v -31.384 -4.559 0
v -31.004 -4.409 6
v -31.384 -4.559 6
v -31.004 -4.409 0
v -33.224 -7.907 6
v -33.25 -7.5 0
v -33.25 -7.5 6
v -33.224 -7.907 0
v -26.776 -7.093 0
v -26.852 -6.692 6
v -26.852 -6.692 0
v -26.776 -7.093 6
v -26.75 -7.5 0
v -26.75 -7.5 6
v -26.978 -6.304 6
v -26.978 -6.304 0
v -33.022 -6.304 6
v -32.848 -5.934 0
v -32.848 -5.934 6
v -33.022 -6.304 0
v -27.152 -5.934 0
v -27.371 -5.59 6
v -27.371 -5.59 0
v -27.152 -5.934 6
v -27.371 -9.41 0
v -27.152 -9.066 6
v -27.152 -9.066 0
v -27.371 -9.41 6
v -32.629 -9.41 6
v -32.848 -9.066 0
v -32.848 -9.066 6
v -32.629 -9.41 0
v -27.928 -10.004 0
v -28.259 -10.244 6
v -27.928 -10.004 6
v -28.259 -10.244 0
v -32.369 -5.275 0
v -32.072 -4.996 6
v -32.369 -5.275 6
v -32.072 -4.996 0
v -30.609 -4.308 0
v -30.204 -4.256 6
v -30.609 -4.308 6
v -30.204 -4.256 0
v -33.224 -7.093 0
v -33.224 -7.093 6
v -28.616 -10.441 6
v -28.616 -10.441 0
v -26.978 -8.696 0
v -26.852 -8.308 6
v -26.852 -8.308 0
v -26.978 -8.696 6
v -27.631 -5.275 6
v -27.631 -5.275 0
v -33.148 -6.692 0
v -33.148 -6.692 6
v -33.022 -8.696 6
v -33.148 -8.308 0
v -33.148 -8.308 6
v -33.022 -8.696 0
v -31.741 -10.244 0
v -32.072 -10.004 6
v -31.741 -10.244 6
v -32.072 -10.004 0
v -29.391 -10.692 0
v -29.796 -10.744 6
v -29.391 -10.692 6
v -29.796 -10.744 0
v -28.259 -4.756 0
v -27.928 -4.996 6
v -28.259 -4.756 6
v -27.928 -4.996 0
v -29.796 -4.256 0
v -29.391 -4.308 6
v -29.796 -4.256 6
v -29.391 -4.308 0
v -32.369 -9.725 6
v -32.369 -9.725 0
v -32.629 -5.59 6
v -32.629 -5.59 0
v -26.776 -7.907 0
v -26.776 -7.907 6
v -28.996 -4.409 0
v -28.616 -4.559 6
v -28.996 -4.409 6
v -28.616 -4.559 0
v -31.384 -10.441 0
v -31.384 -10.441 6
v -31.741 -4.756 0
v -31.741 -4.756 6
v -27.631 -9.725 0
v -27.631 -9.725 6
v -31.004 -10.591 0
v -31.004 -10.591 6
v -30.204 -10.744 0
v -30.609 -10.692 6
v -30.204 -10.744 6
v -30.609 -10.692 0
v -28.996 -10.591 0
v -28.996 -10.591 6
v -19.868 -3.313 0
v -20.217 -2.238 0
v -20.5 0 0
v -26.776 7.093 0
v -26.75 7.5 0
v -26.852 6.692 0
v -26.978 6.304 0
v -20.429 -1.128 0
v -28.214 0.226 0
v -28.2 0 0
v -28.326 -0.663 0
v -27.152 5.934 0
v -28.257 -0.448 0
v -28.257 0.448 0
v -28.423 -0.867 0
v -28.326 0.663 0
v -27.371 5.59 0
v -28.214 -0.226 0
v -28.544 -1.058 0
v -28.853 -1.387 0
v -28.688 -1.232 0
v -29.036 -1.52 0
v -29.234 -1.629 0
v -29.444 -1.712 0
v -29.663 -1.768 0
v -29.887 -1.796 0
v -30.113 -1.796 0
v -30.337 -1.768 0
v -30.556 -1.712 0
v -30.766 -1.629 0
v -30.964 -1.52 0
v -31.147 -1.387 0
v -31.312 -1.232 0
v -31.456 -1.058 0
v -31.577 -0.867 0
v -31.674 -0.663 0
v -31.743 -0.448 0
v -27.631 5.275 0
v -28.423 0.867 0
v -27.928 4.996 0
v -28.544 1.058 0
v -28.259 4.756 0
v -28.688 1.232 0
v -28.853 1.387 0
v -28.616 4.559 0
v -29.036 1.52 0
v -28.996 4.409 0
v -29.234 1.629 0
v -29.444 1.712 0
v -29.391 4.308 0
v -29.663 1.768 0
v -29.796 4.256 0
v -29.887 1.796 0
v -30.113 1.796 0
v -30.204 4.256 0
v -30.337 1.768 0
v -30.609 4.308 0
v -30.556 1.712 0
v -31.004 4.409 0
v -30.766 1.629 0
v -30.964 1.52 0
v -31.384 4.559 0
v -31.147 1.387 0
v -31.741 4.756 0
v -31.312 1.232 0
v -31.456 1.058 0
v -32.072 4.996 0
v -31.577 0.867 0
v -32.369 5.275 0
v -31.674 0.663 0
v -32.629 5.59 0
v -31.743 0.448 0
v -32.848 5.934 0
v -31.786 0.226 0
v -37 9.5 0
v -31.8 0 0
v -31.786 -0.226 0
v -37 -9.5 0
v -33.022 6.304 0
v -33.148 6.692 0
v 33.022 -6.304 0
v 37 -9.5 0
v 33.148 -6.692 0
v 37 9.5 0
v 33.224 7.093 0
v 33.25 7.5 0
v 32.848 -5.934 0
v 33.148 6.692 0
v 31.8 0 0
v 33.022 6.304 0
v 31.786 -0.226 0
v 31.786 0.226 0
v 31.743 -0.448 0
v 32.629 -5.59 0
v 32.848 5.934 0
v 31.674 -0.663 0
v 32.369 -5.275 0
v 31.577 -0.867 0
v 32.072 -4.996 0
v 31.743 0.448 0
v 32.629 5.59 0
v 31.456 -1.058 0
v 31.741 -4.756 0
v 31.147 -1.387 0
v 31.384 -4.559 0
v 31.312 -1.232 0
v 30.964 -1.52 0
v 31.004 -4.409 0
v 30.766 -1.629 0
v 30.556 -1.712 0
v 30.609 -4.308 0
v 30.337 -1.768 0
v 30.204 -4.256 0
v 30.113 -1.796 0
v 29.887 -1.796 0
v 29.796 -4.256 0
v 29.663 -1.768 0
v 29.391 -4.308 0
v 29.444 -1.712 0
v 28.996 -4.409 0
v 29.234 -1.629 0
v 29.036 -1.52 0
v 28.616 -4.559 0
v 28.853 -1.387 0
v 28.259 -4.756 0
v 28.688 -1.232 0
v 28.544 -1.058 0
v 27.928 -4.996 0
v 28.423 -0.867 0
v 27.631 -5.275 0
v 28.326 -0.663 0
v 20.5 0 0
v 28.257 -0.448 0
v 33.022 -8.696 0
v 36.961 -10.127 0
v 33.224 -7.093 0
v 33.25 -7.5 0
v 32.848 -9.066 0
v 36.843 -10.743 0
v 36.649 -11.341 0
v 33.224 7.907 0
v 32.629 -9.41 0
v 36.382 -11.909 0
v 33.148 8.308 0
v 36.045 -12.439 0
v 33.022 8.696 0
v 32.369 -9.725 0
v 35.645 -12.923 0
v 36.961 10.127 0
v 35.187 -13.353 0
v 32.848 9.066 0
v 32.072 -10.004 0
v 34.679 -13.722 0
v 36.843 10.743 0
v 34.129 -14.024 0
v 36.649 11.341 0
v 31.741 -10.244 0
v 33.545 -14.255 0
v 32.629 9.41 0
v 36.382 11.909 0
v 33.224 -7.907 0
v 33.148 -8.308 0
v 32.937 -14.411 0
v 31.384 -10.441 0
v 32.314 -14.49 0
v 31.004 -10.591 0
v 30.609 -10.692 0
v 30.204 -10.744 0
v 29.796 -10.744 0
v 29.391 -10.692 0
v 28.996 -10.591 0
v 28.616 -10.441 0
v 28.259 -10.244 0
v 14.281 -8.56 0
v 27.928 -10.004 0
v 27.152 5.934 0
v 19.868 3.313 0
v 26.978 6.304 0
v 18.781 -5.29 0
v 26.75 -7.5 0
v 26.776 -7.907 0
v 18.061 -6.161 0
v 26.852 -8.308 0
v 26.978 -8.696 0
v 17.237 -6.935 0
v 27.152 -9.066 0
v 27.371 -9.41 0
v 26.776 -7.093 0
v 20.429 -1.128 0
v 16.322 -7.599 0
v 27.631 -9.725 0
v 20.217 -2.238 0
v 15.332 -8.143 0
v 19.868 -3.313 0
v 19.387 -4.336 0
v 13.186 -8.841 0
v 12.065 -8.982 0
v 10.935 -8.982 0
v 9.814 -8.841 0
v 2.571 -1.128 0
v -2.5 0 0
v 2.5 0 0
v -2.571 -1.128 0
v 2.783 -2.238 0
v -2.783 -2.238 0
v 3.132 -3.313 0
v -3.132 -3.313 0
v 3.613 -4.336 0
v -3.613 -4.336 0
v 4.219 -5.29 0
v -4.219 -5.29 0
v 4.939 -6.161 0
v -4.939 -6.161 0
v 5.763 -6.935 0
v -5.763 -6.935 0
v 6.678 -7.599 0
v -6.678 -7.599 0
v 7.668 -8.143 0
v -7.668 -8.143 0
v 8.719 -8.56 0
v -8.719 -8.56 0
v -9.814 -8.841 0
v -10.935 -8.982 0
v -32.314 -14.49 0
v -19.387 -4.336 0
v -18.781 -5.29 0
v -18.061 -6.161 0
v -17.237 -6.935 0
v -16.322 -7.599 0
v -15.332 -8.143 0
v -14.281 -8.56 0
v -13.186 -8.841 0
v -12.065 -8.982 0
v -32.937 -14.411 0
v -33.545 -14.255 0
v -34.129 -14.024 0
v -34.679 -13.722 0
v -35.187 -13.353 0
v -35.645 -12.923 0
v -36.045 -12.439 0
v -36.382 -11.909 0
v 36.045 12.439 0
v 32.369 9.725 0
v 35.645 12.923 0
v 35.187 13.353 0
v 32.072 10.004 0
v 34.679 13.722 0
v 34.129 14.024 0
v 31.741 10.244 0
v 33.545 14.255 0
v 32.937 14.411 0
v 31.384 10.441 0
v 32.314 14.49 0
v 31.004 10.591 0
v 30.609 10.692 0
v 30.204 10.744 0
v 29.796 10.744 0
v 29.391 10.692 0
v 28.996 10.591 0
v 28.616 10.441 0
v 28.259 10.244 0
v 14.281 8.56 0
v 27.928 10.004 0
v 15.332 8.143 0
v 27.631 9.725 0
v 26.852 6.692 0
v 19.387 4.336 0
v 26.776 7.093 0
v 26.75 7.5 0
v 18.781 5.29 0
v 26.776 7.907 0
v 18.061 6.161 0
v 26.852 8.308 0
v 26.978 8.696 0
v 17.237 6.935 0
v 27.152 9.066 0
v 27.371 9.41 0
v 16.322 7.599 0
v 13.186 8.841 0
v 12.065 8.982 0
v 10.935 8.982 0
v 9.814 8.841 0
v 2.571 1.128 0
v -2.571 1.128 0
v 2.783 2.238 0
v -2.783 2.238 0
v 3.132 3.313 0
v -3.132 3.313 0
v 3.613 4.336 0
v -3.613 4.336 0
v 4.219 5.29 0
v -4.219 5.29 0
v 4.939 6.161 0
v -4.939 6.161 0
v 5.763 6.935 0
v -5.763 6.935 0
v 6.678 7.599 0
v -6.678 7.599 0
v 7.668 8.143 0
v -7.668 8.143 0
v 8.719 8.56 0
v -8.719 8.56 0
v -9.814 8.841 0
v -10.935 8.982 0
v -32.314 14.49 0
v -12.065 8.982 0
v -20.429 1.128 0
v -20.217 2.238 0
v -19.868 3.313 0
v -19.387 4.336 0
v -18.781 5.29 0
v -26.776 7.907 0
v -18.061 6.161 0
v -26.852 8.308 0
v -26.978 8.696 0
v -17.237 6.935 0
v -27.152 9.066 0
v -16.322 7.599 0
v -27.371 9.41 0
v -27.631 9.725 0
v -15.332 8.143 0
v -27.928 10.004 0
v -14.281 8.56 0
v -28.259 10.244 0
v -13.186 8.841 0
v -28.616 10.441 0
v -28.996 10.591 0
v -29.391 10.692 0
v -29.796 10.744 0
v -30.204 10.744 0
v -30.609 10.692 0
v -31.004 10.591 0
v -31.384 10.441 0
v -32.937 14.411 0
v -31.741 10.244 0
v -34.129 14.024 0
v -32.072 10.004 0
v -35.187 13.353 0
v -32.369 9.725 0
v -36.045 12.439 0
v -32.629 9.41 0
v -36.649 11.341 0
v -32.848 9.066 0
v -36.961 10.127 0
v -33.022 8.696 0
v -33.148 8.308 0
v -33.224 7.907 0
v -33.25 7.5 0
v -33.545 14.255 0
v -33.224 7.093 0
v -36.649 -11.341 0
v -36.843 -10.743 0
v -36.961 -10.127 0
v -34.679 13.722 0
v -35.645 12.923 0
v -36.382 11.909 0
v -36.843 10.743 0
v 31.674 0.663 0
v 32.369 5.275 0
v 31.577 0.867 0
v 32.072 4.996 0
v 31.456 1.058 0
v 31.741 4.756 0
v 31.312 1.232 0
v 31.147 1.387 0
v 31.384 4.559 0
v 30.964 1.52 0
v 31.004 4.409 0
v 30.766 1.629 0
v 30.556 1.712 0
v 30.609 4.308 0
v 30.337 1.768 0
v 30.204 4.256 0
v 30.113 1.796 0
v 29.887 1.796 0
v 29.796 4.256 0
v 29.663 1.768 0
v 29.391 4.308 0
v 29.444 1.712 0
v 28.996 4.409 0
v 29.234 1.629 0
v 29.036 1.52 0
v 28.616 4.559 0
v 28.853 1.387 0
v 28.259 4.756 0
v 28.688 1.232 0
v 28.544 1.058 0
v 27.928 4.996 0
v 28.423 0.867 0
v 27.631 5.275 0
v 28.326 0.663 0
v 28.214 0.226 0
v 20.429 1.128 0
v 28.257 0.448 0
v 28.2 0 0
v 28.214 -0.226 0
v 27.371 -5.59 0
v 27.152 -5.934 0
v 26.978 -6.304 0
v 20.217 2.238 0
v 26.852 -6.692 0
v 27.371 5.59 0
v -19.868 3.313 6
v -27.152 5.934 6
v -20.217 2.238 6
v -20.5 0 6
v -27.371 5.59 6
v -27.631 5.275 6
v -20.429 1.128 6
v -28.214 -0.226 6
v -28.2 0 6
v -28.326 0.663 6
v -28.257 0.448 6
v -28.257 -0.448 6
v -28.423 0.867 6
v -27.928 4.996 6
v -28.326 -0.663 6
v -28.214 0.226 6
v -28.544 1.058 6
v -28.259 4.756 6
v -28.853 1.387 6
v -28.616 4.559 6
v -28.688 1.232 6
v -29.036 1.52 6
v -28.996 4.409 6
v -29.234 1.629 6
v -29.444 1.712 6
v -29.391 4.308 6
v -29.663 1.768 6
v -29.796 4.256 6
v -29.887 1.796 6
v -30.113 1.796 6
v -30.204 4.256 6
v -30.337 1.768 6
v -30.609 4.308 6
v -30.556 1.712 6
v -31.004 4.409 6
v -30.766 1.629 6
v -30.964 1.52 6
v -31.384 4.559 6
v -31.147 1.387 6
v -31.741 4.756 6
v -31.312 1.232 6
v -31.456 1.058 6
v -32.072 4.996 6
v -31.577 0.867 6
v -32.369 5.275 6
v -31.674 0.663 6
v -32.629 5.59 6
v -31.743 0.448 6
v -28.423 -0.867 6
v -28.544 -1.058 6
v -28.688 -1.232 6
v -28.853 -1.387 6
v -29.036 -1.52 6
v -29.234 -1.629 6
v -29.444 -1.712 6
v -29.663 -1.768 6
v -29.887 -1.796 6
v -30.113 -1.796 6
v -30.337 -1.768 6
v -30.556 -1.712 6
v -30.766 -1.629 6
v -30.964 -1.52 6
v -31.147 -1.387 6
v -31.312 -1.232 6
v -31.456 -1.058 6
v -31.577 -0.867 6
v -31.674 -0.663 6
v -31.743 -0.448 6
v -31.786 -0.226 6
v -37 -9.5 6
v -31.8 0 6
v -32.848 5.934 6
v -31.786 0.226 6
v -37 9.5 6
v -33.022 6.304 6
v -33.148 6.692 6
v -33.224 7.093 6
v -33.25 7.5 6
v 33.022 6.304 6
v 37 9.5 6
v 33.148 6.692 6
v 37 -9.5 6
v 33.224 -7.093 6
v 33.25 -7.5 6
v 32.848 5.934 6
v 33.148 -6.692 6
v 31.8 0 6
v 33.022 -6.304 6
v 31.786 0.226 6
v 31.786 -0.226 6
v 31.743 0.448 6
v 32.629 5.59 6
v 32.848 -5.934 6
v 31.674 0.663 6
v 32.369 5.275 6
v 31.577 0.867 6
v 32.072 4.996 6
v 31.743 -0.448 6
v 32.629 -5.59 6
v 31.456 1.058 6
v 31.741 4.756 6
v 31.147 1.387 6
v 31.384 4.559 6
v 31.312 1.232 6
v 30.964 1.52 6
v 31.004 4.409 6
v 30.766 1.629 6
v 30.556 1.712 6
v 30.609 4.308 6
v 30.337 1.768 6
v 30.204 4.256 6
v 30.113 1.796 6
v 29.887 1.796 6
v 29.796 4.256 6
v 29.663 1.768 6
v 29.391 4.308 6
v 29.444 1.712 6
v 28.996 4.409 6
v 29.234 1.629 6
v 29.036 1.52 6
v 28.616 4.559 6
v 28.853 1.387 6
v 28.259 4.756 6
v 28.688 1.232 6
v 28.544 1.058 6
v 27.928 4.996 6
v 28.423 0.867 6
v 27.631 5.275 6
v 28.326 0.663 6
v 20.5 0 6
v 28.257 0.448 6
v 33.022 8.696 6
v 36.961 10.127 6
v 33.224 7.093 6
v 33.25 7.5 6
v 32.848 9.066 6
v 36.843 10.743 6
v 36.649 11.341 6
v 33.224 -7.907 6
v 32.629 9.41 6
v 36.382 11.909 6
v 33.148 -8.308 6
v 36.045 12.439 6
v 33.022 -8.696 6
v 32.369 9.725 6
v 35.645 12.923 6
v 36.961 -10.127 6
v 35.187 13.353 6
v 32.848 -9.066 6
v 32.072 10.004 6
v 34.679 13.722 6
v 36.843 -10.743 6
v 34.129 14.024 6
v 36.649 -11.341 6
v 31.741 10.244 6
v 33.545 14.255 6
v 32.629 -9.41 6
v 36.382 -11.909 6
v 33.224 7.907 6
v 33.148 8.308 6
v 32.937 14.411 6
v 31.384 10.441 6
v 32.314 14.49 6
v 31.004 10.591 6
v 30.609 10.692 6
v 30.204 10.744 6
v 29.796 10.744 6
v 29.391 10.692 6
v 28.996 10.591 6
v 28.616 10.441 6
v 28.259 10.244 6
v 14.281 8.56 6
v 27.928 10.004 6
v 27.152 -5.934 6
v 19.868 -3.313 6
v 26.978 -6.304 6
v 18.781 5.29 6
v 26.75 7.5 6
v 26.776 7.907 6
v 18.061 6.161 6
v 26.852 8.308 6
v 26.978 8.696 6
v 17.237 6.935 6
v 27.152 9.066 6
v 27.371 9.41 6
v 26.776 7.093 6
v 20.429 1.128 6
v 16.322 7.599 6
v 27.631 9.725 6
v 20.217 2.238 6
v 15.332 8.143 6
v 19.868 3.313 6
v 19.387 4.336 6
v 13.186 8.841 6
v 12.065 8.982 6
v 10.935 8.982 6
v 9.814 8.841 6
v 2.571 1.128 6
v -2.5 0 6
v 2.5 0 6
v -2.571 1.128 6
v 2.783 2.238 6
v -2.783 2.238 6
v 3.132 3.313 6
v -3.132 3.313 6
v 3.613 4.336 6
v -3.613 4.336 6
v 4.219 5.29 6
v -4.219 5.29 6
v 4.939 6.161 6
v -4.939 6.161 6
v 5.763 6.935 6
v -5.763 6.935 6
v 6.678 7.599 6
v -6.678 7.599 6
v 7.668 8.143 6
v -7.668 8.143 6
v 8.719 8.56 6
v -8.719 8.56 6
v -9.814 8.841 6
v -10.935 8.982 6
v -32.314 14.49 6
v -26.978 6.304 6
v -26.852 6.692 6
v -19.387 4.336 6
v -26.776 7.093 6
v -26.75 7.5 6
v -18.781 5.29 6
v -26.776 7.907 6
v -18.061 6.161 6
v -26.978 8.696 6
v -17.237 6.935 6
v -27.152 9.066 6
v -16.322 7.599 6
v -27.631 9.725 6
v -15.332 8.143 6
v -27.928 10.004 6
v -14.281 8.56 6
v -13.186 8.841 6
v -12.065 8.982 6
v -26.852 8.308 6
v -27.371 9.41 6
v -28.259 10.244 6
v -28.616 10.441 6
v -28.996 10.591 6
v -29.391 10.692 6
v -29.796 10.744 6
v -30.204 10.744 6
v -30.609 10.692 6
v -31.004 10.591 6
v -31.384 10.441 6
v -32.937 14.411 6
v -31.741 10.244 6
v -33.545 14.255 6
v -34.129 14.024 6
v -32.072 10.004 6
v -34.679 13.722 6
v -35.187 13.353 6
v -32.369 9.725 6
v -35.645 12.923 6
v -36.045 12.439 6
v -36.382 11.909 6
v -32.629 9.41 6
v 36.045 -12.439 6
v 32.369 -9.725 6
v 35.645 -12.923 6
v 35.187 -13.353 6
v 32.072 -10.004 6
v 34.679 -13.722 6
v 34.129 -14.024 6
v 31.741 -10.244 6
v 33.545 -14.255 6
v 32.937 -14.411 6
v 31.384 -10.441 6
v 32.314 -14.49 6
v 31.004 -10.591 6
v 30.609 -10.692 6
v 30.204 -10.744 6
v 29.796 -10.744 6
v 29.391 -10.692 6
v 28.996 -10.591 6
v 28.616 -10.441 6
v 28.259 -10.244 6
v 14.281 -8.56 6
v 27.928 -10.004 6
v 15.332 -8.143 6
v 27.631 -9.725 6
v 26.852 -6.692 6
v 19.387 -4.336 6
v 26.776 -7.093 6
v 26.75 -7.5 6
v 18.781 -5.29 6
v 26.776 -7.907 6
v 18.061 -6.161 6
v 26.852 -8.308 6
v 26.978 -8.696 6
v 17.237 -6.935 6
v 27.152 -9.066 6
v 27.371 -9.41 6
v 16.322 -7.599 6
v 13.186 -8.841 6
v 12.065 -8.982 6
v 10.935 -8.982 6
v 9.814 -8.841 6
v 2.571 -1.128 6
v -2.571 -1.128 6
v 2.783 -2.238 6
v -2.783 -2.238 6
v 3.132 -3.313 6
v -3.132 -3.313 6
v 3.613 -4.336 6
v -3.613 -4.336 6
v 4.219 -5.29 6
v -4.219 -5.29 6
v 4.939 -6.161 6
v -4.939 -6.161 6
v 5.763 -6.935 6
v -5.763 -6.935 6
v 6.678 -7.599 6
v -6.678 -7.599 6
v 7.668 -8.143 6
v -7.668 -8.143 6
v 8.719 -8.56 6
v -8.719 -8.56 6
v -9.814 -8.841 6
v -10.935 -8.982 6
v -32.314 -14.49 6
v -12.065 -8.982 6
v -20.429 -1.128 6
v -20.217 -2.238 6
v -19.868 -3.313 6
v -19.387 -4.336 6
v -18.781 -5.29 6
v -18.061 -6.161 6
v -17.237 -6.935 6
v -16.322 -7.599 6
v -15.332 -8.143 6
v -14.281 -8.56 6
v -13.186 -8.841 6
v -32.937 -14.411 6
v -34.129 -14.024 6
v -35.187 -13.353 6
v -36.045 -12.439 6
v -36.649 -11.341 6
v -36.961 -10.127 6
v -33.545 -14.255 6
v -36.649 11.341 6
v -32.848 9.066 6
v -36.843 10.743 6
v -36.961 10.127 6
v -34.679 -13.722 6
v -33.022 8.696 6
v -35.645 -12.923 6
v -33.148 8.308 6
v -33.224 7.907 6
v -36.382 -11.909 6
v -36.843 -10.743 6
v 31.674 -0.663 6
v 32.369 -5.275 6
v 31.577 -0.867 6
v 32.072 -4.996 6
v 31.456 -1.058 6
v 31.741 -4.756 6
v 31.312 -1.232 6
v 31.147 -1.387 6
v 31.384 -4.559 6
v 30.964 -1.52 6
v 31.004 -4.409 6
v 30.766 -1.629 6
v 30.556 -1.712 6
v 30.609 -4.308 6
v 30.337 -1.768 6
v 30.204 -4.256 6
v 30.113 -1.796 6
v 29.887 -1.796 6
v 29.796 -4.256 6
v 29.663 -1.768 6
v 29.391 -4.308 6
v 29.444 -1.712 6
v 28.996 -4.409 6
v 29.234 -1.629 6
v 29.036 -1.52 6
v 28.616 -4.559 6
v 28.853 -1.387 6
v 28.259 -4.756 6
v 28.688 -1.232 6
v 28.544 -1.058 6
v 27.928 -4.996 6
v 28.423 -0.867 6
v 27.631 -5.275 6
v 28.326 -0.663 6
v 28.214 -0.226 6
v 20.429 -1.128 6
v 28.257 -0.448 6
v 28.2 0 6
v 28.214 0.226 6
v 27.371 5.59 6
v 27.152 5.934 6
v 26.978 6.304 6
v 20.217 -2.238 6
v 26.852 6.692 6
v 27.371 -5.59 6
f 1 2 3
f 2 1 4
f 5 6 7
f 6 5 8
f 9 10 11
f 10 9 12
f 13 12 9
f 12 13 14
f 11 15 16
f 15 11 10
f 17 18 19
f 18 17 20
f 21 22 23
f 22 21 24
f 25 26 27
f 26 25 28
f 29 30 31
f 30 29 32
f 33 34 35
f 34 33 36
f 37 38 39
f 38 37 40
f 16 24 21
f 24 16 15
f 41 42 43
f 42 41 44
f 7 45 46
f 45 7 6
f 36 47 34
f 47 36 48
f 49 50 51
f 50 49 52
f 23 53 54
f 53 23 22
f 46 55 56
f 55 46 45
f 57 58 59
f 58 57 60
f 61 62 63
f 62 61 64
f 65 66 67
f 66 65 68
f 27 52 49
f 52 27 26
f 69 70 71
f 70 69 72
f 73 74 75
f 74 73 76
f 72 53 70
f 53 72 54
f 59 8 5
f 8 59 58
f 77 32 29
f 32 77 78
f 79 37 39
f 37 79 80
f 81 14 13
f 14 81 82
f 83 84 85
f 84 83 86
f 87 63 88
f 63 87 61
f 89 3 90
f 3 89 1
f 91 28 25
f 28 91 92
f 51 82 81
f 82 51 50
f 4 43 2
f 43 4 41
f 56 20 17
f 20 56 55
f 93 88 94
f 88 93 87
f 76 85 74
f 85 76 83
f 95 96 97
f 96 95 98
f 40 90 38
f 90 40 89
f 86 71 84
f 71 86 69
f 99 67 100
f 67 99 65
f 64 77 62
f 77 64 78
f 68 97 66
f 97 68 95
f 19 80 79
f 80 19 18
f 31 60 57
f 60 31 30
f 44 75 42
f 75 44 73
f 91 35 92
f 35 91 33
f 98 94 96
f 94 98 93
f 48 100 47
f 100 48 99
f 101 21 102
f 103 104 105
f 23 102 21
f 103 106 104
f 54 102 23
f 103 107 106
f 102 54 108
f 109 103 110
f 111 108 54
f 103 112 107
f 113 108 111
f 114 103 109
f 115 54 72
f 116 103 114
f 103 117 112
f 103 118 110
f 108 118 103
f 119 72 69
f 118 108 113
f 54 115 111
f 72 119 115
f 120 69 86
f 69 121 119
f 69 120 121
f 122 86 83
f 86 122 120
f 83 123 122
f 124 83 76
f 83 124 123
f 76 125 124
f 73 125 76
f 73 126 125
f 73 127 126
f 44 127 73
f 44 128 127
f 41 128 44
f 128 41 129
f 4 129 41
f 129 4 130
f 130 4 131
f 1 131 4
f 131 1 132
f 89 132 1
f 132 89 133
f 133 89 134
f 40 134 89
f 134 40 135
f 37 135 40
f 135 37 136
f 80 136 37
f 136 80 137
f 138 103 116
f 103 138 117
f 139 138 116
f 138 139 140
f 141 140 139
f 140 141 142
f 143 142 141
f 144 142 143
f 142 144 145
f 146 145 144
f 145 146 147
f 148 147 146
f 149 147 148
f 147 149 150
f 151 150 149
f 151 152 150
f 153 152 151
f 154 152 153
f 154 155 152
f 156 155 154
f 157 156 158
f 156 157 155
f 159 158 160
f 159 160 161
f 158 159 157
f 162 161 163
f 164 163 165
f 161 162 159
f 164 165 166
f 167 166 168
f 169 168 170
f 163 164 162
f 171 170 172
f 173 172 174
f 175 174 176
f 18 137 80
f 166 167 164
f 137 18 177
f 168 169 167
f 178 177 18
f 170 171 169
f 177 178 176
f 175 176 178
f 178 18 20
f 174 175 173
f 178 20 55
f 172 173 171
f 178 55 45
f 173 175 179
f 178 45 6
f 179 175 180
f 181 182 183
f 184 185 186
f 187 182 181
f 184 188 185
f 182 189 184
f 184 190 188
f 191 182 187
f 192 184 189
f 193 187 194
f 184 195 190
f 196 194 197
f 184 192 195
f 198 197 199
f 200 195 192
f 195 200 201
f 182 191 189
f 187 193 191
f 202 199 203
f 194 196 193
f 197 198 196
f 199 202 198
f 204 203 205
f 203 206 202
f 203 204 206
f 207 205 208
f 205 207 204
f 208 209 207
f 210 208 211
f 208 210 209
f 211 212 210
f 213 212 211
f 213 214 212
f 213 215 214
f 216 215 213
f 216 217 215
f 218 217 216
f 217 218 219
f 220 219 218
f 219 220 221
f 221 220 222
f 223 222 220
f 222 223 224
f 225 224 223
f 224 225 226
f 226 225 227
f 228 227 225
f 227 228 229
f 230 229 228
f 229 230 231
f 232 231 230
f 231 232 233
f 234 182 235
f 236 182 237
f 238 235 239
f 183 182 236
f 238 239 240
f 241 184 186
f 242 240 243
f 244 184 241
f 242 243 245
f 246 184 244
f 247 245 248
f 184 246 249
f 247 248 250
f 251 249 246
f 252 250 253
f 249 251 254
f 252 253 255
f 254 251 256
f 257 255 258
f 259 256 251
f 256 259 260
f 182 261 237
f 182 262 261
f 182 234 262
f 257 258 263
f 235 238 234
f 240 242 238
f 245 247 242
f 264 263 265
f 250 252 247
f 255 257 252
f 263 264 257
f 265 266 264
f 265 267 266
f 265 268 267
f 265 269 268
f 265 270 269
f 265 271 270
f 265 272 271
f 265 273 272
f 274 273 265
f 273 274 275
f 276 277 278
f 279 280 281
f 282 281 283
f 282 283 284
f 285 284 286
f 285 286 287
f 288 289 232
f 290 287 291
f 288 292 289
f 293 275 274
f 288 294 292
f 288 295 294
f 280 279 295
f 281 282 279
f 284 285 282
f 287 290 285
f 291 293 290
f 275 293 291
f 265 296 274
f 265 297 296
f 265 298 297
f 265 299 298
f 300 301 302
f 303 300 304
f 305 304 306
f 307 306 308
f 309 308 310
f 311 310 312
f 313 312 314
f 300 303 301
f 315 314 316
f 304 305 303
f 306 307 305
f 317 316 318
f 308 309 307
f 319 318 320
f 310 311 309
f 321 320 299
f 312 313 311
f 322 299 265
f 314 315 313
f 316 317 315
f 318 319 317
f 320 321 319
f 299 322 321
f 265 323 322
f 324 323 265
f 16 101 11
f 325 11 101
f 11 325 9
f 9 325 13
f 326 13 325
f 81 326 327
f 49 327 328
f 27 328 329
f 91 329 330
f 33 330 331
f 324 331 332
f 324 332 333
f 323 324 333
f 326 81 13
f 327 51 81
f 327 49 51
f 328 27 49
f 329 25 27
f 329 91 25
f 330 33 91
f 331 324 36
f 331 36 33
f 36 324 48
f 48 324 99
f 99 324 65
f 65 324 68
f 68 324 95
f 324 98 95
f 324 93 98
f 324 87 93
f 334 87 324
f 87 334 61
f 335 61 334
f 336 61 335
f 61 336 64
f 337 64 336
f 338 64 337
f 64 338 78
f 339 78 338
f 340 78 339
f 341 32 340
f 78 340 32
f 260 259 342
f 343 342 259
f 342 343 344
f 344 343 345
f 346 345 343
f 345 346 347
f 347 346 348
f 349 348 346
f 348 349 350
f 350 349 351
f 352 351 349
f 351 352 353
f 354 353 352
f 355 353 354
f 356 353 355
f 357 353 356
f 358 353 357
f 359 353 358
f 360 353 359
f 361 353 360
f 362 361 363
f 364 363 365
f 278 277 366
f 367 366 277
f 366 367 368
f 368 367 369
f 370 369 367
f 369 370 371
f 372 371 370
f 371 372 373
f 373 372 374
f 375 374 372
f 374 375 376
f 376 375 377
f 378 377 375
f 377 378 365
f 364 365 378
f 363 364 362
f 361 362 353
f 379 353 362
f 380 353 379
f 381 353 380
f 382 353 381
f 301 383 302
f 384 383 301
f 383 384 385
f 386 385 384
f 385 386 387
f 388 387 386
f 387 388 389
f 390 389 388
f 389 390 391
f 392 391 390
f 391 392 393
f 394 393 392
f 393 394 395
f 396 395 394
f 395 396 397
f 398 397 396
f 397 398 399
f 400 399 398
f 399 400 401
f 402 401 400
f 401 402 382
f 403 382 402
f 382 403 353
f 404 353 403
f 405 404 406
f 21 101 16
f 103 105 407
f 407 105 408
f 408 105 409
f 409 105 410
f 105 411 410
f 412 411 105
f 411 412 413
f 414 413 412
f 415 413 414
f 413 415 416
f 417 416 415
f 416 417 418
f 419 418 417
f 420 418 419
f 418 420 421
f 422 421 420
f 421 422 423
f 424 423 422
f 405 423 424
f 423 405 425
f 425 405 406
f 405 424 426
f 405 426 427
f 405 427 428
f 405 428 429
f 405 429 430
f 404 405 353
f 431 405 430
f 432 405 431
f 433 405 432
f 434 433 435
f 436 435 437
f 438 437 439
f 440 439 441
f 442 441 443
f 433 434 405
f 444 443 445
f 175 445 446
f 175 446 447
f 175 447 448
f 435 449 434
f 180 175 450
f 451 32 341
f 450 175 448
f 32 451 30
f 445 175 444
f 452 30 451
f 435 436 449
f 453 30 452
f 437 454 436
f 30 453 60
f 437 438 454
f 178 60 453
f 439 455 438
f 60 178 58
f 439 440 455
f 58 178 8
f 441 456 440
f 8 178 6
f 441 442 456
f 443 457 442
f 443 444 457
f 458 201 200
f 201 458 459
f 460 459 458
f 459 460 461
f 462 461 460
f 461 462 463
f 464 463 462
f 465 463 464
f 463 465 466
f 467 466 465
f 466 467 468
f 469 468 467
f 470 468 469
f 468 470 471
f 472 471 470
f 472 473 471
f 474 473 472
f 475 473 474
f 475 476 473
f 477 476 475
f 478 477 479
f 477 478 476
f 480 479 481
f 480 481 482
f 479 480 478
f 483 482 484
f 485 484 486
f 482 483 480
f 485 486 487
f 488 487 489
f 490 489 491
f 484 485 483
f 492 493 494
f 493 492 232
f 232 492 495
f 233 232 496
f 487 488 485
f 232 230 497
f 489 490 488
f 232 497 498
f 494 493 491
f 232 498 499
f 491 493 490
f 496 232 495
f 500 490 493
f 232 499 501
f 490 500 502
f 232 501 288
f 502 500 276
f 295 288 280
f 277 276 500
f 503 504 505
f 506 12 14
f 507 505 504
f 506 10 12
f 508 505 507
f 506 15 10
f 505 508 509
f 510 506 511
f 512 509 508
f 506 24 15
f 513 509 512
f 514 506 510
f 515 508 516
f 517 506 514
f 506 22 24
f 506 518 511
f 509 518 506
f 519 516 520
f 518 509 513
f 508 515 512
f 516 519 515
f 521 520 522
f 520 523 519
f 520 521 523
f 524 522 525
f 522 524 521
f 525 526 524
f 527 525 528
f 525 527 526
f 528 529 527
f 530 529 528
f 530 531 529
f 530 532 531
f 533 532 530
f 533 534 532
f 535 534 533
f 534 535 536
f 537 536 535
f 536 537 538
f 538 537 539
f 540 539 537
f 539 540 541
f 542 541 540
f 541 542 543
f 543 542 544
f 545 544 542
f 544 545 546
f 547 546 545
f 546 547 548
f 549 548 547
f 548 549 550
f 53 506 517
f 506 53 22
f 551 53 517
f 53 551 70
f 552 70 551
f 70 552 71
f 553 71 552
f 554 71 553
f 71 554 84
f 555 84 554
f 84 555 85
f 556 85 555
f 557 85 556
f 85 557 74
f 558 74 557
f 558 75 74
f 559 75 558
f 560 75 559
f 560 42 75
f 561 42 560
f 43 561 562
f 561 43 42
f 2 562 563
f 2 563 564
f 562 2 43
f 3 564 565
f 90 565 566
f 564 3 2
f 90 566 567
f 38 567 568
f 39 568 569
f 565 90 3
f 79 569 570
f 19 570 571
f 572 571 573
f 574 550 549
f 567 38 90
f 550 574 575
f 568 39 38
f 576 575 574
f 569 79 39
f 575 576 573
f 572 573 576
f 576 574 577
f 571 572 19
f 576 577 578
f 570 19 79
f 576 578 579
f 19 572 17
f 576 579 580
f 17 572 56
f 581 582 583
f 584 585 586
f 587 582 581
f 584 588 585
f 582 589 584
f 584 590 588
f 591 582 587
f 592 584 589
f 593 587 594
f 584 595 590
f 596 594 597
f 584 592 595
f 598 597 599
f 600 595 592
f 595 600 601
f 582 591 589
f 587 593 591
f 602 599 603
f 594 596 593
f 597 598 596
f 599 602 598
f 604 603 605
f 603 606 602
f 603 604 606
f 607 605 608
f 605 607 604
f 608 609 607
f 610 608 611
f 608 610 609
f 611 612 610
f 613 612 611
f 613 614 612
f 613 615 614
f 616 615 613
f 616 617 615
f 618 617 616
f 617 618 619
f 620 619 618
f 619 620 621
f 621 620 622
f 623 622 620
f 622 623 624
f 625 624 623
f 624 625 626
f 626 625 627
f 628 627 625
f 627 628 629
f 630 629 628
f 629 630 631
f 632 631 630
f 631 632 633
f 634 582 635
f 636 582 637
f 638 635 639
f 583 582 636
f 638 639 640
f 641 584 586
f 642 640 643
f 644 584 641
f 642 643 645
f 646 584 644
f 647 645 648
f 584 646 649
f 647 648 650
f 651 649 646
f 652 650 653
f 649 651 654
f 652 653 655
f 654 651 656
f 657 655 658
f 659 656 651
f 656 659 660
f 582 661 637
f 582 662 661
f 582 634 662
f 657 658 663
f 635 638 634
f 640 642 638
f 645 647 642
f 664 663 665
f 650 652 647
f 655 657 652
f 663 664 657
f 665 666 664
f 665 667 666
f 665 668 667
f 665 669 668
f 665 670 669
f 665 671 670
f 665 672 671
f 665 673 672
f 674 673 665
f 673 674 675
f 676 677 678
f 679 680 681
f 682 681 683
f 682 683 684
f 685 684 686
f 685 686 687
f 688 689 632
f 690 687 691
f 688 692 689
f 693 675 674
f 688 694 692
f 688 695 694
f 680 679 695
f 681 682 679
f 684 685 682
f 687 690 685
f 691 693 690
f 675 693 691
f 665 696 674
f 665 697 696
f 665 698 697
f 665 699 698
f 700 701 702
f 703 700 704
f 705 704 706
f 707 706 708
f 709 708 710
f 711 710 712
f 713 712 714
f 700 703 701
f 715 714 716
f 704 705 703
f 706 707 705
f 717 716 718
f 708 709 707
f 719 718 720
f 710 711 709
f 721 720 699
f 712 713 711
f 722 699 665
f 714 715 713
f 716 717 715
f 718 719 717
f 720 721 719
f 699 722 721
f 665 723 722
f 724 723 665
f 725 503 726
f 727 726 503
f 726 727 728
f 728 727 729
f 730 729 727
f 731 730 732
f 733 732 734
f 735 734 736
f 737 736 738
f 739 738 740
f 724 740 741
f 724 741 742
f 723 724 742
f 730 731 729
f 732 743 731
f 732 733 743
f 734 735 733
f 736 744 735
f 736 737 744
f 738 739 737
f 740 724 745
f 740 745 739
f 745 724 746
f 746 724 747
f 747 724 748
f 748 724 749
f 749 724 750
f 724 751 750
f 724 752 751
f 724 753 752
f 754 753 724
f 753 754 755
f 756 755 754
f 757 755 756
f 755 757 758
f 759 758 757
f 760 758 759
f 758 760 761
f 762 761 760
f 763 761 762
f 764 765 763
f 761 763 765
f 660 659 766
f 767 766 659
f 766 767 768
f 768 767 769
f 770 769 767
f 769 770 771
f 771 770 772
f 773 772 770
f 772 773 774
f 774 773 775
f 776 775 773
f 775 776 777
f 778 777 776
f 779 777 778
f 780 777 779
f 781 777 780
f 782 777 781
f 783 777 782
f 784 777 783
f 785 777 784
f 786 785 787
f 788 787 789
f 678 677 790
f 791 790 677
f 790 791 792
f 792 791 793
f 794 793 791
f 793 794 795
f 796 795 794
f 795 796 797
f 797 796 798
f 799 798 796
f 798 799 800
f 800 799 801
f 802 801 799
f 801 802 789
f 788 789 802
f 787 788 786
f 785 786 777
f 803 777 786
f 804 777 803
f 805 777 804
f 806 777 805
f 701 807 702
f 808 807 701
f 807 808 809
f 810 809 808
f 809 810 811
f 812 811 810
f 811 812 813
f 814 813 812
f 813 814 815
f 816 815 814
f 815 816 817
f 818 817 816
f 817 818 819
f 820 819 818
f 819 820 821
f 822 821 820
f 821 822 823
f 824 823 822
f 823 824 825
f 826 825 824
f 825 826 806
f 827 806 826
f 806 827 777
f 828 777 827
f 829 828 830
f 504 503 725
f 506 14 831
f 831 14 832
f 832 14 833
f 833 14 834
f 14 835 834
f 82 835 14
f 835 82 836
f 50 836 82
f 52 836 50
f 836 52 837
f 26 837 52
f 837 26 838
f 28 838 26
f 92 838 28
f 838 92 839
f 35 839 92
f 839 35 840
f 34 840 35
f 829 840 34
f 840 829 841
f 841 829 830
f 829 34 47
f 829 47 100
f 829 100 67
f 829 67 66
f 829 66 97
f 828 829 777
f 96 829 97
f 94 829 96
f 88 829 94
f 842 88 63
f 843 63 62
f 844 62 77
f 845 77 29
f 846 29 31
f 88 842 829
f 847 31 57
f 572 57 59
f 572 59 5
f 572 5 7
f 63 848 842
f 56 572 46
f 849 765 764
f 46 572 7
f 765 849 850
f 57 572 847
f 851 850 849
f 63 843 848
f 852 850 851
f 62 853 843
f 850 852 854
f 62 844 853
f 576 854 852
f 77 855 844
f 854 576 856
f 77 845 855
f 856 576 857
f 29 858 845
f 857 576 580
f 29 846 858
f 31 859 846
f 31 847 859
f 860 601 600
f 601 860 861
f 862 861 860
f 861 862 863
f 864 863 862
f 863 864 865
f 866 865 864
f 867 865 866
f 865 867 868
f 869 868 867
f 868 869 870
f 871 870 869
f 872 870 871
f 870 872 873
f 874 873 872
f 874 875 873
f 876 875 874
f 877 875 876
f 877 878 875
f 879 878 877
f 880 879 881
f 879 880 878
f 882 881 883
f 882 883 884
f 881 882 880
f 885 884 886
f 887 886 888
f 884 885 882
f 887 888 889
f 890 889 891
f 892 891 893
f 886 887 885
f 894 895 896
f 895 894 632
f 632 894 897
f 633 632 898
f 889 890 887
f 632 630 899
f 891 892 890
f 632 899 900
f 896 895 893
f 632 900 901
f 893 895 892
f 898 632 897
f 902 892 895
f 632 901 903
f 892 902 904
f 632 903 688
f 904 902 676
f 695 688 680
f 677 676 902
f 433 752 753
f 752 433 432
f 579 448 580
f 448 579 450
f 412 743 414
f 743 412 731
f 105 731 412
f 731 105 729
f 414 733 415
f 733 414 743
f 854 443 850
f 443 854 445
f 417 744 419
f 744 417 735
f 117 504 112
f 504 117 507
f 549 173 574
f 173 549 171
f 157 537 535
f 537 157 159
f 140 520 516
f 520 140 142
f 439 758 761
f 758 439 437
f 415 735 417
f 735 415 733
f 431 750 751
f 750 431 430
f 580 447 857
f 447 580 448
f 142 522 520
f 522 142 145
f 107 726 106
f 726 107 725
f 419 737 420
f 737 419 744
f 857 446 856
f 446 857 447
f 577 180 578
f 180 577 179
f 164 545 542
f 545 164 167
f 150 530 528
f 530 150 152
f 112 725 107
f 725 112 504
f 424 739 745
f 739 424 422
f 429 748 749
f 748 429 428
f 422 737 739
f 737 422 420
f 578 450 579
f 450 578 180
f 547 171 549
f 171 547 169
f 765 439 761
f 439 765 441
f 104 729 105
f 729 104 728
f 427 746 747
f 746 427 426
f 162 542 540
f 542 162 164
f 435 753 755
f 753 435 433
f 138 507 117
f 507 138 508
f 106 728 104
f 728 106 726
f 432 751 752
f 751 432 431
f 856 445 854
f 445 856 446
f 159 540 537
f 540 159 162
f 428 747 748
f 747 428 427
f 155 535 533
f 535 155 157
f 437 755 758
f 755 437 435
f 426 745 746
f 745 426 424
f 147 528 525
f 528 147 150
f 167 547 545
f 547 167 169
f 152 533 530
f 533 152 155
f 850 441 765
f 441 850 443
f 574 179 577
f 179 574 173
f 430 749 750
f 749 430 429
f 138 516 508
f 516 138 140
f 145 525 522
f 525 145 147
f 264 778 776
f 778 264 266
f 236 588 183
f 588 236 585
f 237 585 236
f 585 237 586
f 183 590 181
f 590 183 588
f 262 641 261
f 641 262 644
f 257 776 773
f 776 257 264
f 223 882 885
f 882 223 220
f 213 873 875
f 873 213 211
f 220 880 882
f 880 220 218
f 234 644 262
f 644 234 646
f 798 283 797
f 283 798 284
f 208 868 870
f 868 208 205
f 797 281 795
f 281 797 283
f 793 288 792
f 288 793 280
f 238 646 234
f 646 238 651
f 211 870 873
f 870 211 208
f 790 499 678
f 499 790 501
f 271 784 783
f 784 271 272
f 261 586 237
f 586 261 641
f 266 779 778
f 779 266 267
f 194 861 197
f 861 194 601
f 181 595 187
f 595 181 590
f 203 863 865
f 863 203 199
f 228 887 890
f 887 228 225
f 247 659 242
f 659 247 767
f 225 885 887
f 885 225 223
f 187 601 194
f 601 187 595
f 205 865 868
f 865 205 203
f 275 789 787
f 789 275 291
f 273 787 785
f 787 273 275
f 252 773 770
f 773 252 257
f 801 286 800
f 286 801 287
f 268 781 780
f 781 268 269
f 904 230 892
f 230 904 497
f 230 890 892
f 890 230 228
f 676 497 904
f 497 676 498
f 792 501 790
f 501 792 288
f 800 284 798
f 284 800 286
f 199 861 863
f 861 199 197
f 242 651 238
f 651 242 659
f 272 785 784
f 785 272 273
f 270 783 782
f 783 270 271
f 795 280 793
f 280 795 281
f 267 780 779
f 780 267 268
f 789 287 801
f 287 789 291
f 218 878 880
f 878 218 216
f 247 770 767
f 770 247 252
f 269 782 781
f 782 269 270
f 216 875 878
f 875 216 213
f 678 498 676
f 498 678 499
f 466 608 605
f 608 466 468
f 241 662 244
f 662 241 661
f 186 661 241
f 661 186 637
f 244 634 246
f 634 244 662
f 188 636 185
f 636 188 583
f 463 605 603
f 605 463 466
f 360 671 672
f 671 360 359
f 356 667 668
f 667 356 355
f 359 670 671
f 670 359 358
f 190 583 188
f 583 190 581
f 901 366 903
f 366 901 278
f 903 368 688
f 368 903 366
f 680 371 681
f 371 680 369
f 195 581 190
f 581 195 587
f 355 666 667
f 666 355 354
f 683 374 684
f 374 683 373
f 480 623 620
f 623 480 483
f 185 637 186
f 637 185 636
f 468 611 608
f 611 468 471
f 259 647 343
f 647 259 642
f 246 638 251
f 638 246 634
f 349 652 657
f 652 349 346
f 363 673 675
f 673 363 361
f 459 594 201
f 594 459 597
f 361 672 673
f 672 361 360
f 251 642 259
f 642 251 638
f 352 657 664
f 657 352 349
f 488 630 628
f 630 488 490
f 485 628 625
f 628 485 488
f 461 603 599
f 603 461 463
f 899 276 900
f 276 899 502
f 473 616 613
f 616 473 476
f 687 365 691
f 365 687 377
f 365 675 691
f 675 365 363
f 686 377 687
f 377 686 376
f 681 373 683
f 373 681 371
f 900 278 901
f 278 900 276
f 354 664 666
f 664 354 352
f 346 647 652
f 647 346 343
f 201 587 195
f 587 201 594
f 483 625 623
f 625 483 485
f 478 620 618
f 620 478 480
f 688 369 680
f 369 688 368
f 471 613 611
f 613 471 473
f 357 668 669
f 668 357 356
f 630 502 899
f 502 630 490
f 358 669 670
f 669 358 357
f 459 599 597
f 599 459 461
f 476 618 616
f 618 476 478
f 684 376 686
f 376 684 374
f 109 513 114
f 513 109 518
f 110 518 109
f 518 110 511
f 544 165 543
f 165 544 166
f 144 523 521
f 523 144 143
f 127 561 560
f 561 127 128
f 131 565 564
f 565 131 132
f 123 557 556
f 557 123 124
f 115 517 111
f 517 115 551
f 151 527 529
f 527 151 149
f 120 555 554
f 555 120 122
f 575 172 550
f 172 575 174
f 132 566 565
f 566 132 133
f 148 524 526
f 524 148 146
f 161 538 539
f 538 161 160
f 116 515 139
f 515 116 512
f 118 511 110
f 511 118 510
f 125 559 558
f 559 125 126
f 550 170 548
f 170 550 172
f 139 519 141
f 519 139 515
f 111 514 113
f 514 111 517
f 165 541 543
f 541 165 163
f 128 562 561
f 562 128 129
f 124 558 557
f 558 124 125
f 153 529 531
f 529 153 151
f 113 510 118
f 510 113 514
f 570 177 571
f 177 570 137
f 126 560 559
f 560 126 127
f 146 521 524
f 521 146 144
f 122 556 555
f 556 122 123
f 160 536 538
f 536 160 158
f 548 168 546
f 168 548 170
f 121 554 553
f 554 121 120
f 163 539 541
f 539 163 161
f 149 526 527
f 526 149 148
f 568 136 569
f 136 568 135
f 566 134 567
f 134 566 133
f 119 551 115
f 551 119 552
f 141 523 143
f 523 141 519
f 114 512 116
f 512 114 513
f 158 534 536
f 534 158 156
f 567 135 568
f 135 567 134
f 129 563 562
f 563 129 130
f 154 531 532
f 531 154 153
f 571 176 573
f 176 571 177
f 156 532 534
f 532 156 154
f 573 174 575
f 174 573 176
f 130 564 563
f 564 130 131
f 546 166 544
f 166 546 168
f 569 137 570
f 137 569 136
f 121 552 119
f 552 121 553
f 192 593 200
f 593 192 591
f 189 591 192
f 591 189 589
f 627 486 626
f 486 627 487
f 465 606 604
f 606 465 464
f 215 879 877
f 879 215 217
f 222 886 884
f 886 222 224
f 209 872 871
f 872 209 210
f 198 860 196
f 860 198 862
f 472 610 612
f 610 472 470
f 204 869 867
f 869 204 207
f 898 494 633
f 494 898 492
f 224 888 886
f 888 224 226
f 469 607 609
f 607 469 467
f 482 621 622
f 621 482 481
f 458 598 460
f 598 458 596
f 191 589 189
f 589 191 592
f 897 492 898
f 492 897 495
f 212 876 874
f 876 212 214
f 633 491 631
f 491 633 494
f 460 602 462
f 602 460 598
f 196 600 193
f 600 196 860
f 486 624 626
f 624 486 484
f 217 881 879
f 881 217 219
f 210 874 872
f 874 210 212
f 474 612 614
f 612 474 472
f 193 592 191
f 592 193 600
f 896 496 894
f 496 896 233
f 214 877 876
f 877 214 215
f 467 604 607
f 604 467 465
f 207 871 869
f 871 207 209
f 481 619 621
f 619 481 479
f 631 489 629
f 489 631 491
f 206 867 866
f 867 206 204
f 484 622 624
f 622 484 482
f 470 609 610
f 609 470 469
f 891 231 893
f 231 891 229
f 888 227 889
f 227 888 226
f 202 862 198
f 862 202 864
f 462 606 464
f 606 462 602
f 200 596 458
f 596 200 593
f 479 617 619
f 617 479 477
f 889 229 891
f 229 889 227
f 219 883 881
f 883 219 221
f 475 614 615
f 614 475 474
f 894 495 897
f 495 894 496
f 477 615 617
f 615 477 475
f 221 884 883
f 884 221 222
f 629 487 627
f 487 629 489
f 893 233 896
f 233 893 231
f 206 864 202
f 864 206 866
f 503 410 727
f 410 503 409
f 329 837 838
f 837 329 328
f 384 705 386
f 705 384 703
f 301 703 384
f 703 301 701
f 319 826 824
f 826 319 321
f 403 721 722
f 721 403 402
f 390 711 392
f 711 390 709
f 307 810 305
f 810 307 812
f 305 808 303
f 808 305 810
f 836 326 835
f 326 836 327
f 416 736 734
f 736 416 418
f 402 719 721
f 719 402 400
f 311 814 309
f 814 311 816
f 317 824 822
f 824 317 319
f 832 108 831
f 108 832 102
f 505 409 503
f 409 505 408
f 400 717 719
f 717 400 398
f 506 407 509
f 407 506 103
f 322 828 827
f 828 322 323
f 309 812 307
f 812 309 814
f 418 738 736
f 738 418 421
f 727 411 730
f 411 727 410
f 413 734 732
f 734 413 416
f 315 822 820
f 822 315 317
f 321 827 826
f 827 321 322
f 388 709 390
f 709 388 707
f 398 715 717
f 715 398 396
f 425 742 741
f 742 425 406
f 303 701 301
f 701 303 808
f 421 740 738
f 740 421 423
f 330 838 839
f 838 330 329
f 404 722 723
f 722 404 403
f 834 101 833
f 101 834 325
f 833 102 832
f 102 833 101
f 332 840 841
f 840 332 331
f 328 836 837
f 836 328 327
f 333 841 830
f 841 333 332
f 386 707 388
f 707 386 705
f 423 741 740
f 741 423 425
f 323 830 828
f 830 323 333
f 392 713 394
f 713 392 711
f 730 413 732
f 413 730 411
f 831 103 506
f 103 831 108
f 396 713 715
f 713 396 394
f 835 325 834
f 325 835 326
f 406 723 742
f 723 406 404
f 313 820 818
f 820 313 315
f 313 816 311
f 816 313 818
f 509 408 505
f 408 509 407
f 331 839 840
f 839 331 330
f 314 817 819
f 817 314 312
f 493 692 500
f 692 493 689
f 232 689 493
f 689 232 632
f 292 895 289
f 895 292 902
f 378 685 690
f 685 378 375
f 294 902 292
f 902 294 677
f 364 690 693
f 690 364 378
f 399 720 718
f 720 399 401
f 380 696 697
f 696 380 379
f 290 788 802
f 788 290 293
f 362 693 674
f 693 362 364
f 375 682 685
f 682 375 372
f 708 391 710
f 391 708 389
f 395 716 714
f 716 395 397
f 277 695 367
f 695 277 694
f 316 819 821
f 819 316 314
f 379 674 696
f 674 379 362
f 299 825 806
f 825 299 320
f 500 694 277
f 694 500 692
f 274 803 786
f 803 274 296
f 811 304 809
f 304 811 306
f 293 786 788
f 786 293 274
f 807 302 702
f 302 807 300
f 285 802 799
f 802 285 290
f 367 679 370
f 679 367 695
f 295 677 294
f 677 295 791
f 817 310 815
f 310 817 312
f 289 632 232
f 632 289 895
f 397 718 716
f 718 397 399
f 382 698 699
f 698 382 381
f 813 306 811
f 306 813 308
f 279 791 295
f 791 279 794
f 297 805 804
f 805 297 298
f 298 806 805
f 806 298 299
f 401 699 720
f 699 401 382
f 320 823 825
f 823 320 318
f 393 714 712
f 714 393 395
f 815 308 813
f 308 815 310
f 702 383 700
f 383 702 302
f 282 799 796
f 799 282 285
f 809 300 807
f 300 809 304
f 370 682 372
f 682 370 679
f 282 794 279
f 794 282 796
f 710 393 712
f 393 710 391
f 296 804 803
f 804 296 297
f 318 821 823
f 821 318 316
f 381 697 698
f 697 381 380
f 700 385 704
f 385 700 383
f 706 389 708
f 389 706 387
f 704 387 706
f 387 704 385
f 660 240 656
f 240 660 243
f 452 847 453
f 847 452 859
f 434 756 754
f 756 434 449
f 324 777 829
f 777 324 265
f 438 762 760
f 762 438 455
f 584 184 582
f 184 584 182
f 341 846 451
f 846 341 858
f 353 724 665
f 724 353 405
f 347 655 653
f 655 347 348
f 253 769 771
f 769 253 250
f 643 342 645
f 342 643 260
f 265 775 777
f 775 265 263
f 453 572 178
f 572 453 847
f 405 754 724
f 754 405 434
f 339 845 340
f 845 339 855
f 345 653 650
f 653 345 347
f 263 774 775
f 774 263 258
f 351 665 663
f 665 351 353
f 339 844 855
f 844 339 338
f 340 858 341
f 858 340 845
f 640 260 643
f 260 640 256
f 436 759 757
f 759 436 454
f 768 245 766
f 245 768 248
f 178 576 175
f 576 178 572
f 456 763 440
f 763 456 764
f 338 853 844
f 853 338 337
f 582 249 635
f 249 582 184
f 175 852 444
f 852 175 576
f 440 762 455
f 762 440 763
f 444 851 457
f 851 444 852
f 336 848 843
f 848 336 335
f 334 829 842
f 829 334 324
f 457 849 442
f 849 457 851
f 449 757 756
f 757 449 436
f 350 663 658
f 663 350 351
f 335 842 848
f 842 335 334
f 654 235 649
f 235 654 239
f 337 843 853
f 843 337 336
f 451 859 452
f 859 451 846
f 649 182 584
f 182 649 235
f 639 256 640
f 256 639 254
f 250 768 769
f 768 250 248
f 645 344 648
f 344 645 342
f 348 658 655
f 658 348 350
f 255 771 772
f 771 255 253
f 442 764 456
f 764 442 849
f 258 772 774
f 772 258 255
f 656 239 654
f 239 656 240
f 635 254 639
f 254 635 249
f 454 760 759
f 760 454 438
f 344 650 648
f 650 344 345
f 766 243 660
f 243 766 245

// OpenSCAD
$fn = 50;

difference() {
	union() {
		hull() {
			translate(v = [-32.0, 9.5, 0]) {
				cylinder(h = 6, r = 5);
			}
			translate(v = [32.0, 9.5, 0]) {
				cylinder(h = 6, r = 5);
			}
			translate(v = [-32.0, -9.5, 0]) {
				cylinder(h = 6, r = 5);
			}
			translate(v = [32.0, -9.5, 0]) {
				cylinder(h = 6, r = 5);
			}
		}
	}
	union() {
		translate(v = [-30.0, -7.5, 0]) {
			cylinder(h = 6, r = 3.25);
		}
		translate(v = [-30.0, 7.5, 0]) {
			cylinder(h = 6, r = 3.25);
		}
		translate(v = [30.0, -7.5, 0]) {
			cylinder(h = 6, r = 3.25);
		}
		translate(v = [30.0, 7.5, 0]) {
			cylinder(h = 6, r = 3.25);
		}
		translate(v = [-30.0, 0.0, 0]) {
			cylinder(h = 6, r = 1.8);
		}
		translate(v = [30.0, 0.0, 0]) {
			cylinder(h = 6, r = 1.8);
		}
		translate(v = [-11.5, 0, 0.0]) {
			cylinder(h = 6, r = 9.0);
		}
		translate(v = [11.5, 0, 0.0]) {
			cylinder(h = 6, r = 9.0);
		}
	}
}
